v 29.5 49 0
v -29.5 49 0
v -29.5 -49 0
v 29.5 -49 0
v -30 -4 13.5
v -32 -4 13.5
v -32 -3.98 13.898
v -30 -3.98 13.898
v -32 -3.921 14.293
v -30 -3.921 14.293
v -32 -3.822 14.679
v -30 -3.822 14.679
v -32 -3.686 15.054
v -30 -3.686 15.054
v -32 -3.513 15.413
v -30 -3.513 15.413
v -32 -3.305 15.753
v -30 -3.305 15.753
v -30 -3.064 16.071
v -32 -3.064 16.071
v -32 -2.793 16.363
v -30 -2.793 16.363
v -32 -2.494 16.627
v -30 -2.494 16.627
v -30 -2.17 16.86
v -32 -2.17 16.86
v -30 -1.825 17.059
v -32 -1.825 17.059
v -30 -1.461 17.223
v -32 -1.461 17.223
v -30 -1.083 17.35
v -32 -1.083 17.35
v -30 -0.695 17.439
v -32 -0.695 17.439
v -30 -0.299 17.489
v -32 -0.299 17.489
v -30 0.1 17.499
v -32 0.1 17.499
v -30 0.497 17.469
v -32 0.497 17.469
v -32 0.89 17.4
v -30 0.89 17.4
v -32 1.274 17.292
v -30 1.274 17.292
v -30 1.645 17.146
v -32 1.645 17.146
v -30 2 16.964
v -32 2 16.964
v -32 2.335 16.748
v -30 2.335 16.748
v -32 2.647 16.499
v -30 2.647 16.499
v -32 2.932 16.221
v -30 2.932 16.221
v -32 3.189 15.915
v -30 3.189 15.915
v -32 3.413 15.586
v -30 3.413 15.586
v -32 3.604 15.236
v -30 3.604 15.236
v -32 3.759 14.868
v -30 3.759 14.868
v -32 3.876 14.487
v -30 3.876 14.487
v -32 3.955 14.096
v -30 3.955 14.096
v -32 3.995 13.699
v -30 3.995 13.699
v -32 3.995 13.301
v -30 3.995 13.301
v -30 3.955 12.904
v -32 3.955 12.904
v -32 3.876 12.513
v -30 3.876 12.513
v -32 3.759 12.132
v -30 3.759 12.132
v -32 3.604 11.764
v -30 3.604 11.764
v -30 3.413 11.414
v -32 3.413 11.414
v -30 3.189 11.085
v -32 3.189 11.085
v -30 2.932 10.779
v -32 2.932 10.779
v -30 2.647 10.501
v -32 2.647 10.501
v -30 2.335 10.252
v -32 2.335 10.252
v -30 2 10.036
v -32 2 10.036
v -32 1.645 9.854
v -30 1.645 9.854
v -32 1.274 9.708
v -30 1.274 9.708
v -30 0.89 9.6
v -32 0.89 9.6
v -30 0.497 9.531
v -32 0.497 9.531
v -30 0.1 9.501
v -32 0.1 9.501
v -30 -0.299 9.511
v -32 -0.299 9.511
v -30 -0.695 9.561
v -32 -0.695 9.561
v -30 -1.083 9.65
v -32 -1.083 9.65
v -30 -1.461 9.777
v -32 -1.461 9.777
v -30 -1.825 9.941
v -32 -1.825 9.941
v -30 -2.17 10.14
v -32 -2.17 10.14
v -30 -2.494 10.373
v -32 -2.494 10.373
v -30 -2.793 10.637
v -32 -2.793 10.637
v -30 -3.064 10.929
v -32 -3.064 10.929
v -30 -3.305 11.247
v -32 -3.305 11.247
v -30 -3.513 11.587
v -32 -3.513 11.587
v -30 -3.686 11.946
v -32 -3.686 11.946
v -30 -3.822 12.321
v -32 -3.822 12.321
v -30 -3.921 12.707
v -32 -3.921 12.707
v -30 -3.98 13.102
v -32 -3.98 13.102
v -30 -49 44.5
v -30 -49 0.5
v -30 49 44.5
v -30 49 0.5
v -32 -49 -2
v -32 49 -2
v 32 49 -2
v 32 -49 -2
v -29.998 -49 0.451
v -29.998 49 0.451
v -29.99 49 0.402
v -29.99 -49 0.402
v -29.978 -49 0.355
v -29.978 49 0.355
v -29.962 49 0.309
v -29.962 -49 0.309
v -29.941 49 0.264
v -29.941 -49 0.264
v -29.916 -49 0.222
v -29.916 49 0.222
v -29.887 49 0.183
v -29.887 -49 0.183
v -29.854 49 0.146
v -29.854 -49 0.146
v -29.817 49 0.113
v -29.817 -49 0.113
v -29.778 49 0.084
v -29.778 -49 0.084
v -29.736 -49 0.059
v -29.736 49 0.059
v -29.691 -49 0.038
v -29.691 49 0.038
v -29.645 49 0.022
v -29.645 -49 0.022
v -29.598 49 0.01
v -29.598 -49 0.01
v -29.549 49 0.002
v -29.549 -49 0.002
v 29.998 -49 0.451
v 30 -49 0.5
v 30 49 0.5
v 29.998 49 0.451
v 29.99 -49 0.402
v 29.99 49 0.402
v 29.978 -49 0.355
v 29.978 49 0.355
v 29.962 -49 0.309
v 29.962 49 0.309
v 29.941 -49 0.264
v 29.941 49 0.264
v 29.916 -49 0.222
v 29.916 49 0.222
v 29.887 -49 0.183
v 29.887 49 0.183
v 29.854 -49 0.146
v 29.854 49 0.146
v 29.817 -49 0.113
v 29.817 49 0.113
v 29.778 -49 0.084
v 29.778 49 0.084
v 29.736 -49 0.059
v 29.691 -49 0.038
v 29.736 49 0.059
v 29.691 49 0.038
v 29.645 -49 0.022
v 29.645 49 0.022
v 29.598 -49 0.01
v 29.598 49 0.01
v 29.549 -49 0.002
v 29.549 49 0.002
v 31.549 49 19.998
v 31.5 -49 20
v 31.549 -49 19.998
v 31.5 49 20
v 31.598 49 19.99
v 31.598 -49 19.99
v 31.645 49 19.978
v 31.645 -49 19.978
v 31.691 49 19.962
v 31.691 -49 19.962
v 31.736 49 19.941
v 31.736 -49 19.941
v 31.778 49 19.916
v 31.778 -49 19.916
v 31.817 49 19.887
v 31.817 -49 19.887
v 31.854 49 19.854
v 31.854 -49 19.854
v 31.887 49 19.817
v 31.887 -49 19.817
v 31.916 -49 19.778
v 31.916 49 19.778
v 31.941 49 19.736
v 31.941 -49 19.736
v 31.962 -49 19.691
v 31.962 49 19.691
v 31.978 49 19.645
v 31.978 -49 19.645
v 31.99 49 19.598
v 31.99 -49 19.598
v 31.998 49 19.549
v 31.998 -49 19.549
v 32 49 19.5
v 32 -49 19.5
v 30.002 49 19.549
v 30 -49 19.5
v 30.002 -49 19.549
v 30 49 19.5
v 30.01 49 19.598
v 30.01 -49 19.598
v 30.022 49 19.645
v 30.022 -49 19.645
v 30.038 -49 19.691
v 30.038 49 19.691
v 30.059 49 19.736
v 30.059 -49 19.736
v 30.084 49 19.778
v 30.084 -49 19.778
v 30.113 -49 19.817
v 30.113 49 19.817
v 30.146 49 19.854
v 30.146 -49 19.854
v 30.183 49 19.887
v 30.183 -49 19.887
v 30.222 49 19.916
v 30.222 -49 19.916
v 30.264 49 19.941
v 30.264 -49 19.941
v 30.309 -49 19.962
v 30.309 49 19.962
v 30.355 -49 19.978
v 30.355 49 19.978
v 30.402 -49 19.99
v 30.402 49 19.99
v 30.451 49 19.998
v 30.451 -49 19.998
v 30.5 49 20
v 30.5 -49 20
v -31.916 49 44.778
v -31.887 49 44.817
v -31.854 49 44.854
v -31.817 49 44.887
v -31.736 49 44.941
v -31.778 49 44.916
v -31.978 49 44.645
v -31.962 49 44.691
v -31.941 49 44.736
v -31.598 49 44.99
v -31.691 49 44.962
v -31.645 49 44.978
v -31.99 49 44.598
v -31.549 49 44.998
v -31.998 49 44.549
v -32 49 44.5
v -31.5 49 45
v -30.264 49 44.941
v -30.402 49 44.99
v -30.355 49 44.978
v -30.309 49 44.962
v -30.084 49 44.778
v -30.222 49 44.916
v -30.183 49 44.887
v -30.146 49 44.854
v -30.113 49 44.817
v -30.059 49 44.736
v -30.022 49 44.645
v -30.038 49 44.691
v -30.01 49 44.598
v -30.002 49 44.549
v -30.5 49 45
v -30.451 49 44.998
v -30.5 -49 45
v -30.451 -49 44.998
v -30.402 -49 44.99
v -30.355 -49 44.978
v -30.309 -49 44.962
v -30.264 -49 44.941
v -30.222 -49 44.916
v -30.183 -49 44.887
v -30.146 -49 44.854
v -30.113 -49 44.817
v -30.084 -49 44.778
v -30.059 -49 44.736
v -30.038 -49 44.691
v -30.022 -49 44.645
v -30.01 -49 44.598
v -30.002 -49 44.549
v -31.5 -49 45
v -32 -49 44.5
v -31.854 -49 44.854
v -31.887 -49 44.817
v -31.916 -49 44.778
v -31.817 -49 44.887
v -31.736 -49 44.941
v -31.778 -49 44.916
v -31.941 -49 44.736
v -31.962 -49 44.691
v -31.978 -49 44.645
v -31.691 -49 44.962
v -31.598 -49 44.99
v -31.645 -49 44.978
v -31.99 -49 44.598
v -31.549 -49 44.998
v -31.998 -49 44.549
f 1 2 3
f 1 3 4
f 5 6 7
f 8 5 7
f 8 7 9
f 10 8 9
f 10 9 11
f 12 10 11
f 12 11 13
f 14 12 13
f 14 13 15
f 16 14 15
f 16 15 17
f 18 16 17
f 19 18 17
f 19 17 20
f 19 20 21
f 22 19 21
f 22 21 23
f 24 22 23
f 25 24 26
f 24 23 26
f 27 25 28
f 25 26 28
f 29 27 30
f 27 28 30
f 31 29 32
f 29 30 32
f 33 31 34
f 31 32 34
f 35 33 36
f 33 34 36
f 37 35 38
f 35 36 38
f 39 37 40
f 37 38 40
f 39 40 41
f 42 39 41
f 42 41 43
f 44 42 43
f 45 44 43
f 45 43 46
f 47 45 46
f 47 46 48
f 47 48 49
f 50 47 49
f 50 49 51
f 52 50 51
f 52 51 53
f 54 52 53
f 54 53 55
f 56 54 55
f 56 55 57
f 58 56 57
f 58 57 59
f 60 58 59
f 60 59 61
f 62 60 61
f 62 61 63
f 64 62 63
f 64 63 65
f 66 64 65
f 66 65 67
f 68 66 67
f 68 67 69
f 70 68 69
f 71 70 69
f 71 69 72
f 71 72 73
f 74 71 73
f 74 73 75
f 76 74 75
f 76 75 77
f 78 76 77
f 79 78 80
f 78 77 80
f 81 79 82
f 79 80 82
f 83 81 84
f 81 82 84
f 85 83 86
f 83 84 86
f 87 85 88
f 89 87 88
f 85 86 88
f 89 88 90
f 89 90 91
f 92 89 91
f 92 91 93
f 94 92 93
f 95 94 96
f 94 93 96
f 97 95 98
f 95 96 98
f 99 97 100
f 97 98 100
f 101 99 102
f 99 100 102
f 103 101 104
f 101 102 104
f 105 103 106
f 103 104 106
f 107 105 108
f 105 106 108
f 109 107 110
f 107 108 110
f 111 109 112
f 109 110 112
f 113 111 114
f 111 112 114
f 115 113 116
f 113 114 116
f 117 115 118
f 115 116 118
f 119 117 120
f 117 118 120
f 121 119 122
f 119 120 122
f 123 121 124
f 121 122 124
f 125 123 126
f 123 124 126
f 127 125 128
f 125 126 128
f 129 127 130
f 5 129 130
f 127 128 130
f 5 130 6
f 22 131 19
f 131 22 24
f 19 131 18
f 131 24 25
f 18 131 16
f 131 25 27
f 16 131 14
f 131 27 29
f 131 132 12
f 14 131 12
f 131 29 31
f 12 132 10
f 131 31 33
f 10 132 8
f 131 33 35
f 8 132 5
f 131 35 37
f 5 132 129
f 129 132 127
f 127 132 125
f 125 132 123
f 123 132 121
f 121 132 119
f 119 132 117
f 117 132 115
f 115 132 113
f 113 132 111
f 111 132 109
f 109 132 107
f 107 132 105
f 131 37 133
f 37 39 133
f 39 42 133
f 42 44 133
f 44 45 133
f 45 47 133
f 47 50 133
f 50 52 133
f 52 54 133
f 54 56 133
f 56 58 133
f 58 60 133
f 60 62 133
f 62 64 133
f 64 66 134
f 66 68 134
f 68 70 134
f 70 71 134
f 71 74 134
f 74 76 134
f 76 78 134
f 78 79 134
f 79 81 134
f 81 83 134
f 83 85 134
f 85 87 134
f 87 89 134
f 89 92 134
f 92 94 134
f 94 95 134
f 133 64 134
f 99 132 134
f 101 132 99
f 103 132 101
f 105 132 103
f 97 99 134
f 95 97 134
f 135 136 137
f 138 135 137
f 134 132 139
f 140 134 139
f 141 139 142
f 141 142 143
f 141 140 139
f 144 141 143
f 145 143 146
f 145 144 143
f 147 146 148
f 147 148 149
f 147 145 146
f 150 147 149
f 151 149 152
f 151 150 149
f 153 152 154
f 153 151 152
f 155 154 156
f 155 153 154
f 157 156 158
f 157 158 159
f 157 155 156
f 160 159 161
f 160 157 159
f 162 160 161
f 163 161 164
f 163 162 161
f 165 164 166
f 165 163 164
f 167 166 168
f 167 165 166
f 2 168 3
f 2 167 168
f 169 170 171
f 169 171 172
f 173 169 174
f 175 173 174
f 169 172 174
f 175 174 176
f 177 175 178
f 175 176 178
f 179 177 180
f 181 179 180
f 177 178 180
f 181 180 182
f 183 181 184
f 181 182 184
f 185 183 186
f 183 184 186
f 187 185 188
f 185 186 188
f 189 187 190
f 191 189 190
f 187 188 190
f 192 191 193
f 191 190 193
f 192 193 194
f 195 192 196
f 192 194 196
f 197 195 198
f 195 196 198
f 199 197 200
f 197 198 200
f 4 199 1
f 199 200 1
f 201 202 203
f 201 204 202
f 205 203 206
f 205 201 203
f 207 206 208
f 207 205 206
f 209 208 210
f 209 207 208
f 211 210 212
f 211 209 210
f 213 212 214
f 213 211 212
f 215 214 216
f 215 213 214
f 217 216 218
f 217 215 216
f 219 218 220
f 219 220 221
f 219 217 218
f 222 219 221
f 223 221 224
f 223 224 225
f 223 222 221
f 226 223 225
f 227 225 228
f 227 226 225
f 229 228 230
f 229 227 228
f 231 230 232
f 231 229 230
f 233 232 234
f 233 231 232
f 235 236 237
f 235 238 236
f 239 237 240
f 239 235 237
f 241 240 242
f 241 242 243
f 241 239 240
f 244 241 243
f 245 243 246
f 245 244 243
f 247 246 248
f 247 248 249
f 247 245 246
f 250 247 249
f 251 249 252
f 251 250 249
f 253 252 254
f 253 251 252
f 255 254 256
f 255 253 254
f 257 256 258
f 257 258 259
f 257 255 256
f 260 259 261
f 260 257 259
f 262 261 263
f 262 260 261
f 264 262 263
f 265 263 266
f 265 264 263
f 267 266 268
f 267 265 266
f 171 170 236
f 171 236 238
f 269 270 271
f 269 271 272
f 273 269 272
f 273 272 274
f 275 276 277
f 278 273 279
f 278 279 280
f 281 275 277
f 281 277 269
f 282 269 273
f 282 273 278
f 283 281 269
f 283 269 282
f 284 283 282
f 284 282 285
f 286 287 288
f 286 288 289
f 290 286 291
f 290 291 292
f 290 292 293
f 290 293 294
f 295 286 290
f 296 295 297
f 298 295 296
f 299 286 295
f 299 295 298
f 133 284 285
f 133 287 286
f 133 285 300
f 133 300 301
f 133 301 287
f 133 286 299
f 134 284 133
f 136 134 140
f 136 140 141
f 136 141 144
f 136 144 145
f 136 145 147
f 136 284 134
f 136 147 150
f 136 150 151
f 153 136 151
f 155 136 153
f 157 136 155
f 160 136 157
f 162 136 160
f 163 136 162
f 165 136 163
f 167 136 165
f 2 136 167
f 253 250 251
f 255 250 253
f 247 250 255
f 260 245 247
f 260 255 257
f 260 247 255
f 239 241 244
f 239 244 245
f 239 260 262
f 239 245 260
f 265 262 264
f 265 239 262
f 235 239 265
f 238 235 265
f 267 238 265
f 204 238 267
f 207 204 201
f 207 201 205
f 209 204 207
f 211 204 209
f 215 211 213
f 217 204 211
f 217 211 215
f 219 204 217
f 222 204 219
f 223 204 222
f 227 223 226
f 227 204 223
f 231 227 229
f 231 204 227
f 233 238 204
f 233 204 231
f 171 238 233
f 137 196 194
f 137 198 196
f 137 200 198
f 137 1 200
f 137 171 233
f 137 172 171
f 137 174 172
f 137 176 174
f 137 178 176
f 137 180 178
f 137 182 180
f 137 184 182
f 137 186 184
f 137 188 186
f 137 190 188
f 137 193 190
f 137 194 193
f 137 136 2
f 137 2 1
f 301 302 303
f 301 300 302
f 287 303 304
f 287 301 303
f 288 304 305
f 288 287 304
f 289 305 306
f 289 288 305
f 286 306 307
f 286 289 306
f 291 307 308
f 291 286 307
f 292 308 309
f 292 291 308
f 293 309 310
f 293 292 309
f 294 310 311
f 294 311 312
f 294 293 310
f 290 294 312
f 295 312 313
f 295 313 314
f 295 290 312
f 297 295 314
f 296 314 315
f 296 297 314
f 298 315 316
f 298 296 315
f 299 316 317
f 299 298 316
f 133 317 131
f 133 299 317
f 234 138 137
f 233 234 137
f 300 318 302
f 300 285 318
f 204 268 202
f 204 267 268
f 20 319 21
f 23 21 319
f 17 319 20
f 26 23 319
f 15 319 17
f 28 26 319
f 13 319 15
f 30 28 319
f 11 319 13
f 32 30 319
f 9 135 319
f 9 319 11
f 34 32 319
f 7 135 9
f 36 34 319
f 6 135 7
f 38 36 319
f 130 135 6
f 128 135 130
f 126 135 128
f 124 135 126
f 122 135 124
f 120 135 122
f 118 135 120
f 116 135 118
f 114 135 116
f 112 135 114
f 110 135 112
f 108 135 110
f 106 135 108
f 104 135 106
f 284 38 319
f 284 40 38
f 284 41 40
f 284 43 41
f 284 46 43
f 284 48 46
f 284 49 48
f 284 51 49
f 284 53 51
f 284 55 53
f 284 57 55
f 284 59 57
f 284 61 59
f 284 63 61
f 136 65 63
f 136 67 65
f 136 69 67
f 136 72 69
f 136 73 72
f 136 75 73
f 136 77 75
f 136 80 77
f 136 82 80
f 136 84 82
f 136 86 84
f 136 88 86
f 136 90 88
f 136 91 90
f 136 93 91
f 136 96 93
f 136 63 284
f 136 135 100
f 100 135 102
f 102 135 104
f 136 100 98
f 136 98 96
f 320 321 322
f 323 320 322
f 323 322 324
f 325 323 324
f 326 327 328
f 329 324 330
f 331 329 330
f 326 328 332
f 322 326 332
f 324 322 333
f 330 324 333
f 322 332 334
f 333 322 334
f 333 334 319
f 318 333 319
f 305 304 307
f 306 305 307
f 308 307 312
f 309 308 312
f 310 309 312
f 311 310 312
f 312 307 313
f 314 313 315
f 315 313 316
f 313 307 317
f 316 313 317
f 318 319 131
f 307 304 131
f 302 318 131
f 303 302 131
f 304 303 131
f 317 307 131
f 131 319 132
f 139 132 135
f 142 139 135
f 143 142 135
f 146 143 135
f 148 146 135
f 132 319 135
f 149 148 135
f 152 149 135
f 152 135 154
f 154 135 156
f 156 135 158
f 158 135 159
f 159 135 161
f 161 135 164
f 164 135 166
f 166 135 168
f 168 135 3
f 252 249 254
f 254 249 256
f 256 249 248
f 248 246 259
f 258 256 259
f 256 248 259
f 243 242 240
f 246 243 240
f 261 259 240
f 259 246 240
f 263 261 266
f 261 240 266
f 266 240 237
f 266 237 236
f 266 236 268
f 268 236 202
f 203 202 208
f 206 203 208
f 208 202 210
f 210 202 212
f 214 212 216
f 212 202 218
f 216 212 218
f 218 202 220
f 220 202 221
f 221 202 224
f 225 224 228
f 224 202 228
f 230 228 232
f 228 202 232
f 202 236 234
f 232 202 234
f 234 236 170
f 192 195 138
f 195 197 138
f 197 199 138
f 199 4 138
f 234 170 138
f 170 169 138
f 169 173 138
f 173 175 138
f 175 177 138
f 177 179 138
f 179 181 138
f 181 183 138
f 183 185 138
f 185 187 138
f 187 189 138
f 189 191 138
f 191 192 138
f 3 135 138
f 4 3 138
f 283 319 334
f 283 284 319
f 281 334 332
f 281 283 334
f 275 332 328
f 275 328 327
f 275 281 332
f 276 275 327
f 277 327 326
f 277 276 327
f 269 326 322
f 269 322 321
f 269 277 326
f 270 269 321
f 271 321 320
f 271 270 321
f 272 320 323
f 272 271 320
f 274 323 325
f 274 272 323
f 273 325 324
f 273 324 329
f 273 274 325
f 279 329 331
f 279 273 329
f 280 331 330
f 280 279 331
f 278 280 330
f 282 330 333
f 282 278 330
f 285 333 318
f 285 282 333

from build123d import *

# Parameters (mm, degrees)
SCHIZZO1_W                   = 64
SCHIZZO1_H                   = 98
ESTRUSIONE_ESTRUSIONE1_DEPTH = 2
SCHIZZO4_W                   = 2
SCHIZZO4_H                   = 98
ESTRUSIONE_ESTRUSIONE2_DEPTH = 45
SCHIZZO5_W                   = 2
SCHIZZO5_H                   = 98
ESTRUSIONE_ESTRUSIONE3_DEPTH = 20
RACCORDO1_R                  = 0.5
SCHIZZO6_R                   = 4
TAGLIO_ESTRUSIONE1_DEPTH     = 10


with BuildPart() as part:
    # Schizzo1 → Estrusione-Estrusione1 (new body)
    with BuildSketch(Plane.XY):
        Rectangle(SCHIZZO1_W, SCHIZZO1_H)
    extrude(amount=-ESTRUSIONE_ESTRUSIONE1_DEPTH)

    # Schizzo4 → Estrusione-Estrusione2 (add)
    with BuildSketch(Plane.XY):
        with Locations((-31, 0)):
            Rectangle(SCHIZZO4_W, SCHIZZO4_H)
    extrude(amount=ESTRUSIONE_ESTRUSIONE2_DEPTH)

    # Schizzo5 → Estrusione-Estrusione3 (add)
    with BuildSketch(Plane.XY):
        with Locations((31, 0)):
            Rectangle(SCHIZZO5_W, SCHIZZO5_H)
    extrude(amount=ESTRUSIONE_ESTRUSIONE3_DEPTH)

    # Raccordo1
    raccordo1_edges = [part.edges().sort_by_distance(p)[0] for p in [
        (-30, 0, 0),
        (-32, 0, 45),
        (-30, 0, 45),
        (30, 0, 0),
        (32, 0, 20),
        (30, 0, 20),
    ]]
    fillet(raccordo1_edges, radius=RACCORDO1_R)

    # Schizzo6 → Taglio-Estrusione1 (cut)
    with BuildSketch(Plane.ZY.offset(32)):
        with Locations(Location((13.5, 0, 0), (0, 0, 270))):
            Circle(SCHIZZO6_R)
    extrude(amount=-TAGLIO_ESTRUSIONE1_DEPTH, mode=Mode.SUBTRACT)


solid = part.part
